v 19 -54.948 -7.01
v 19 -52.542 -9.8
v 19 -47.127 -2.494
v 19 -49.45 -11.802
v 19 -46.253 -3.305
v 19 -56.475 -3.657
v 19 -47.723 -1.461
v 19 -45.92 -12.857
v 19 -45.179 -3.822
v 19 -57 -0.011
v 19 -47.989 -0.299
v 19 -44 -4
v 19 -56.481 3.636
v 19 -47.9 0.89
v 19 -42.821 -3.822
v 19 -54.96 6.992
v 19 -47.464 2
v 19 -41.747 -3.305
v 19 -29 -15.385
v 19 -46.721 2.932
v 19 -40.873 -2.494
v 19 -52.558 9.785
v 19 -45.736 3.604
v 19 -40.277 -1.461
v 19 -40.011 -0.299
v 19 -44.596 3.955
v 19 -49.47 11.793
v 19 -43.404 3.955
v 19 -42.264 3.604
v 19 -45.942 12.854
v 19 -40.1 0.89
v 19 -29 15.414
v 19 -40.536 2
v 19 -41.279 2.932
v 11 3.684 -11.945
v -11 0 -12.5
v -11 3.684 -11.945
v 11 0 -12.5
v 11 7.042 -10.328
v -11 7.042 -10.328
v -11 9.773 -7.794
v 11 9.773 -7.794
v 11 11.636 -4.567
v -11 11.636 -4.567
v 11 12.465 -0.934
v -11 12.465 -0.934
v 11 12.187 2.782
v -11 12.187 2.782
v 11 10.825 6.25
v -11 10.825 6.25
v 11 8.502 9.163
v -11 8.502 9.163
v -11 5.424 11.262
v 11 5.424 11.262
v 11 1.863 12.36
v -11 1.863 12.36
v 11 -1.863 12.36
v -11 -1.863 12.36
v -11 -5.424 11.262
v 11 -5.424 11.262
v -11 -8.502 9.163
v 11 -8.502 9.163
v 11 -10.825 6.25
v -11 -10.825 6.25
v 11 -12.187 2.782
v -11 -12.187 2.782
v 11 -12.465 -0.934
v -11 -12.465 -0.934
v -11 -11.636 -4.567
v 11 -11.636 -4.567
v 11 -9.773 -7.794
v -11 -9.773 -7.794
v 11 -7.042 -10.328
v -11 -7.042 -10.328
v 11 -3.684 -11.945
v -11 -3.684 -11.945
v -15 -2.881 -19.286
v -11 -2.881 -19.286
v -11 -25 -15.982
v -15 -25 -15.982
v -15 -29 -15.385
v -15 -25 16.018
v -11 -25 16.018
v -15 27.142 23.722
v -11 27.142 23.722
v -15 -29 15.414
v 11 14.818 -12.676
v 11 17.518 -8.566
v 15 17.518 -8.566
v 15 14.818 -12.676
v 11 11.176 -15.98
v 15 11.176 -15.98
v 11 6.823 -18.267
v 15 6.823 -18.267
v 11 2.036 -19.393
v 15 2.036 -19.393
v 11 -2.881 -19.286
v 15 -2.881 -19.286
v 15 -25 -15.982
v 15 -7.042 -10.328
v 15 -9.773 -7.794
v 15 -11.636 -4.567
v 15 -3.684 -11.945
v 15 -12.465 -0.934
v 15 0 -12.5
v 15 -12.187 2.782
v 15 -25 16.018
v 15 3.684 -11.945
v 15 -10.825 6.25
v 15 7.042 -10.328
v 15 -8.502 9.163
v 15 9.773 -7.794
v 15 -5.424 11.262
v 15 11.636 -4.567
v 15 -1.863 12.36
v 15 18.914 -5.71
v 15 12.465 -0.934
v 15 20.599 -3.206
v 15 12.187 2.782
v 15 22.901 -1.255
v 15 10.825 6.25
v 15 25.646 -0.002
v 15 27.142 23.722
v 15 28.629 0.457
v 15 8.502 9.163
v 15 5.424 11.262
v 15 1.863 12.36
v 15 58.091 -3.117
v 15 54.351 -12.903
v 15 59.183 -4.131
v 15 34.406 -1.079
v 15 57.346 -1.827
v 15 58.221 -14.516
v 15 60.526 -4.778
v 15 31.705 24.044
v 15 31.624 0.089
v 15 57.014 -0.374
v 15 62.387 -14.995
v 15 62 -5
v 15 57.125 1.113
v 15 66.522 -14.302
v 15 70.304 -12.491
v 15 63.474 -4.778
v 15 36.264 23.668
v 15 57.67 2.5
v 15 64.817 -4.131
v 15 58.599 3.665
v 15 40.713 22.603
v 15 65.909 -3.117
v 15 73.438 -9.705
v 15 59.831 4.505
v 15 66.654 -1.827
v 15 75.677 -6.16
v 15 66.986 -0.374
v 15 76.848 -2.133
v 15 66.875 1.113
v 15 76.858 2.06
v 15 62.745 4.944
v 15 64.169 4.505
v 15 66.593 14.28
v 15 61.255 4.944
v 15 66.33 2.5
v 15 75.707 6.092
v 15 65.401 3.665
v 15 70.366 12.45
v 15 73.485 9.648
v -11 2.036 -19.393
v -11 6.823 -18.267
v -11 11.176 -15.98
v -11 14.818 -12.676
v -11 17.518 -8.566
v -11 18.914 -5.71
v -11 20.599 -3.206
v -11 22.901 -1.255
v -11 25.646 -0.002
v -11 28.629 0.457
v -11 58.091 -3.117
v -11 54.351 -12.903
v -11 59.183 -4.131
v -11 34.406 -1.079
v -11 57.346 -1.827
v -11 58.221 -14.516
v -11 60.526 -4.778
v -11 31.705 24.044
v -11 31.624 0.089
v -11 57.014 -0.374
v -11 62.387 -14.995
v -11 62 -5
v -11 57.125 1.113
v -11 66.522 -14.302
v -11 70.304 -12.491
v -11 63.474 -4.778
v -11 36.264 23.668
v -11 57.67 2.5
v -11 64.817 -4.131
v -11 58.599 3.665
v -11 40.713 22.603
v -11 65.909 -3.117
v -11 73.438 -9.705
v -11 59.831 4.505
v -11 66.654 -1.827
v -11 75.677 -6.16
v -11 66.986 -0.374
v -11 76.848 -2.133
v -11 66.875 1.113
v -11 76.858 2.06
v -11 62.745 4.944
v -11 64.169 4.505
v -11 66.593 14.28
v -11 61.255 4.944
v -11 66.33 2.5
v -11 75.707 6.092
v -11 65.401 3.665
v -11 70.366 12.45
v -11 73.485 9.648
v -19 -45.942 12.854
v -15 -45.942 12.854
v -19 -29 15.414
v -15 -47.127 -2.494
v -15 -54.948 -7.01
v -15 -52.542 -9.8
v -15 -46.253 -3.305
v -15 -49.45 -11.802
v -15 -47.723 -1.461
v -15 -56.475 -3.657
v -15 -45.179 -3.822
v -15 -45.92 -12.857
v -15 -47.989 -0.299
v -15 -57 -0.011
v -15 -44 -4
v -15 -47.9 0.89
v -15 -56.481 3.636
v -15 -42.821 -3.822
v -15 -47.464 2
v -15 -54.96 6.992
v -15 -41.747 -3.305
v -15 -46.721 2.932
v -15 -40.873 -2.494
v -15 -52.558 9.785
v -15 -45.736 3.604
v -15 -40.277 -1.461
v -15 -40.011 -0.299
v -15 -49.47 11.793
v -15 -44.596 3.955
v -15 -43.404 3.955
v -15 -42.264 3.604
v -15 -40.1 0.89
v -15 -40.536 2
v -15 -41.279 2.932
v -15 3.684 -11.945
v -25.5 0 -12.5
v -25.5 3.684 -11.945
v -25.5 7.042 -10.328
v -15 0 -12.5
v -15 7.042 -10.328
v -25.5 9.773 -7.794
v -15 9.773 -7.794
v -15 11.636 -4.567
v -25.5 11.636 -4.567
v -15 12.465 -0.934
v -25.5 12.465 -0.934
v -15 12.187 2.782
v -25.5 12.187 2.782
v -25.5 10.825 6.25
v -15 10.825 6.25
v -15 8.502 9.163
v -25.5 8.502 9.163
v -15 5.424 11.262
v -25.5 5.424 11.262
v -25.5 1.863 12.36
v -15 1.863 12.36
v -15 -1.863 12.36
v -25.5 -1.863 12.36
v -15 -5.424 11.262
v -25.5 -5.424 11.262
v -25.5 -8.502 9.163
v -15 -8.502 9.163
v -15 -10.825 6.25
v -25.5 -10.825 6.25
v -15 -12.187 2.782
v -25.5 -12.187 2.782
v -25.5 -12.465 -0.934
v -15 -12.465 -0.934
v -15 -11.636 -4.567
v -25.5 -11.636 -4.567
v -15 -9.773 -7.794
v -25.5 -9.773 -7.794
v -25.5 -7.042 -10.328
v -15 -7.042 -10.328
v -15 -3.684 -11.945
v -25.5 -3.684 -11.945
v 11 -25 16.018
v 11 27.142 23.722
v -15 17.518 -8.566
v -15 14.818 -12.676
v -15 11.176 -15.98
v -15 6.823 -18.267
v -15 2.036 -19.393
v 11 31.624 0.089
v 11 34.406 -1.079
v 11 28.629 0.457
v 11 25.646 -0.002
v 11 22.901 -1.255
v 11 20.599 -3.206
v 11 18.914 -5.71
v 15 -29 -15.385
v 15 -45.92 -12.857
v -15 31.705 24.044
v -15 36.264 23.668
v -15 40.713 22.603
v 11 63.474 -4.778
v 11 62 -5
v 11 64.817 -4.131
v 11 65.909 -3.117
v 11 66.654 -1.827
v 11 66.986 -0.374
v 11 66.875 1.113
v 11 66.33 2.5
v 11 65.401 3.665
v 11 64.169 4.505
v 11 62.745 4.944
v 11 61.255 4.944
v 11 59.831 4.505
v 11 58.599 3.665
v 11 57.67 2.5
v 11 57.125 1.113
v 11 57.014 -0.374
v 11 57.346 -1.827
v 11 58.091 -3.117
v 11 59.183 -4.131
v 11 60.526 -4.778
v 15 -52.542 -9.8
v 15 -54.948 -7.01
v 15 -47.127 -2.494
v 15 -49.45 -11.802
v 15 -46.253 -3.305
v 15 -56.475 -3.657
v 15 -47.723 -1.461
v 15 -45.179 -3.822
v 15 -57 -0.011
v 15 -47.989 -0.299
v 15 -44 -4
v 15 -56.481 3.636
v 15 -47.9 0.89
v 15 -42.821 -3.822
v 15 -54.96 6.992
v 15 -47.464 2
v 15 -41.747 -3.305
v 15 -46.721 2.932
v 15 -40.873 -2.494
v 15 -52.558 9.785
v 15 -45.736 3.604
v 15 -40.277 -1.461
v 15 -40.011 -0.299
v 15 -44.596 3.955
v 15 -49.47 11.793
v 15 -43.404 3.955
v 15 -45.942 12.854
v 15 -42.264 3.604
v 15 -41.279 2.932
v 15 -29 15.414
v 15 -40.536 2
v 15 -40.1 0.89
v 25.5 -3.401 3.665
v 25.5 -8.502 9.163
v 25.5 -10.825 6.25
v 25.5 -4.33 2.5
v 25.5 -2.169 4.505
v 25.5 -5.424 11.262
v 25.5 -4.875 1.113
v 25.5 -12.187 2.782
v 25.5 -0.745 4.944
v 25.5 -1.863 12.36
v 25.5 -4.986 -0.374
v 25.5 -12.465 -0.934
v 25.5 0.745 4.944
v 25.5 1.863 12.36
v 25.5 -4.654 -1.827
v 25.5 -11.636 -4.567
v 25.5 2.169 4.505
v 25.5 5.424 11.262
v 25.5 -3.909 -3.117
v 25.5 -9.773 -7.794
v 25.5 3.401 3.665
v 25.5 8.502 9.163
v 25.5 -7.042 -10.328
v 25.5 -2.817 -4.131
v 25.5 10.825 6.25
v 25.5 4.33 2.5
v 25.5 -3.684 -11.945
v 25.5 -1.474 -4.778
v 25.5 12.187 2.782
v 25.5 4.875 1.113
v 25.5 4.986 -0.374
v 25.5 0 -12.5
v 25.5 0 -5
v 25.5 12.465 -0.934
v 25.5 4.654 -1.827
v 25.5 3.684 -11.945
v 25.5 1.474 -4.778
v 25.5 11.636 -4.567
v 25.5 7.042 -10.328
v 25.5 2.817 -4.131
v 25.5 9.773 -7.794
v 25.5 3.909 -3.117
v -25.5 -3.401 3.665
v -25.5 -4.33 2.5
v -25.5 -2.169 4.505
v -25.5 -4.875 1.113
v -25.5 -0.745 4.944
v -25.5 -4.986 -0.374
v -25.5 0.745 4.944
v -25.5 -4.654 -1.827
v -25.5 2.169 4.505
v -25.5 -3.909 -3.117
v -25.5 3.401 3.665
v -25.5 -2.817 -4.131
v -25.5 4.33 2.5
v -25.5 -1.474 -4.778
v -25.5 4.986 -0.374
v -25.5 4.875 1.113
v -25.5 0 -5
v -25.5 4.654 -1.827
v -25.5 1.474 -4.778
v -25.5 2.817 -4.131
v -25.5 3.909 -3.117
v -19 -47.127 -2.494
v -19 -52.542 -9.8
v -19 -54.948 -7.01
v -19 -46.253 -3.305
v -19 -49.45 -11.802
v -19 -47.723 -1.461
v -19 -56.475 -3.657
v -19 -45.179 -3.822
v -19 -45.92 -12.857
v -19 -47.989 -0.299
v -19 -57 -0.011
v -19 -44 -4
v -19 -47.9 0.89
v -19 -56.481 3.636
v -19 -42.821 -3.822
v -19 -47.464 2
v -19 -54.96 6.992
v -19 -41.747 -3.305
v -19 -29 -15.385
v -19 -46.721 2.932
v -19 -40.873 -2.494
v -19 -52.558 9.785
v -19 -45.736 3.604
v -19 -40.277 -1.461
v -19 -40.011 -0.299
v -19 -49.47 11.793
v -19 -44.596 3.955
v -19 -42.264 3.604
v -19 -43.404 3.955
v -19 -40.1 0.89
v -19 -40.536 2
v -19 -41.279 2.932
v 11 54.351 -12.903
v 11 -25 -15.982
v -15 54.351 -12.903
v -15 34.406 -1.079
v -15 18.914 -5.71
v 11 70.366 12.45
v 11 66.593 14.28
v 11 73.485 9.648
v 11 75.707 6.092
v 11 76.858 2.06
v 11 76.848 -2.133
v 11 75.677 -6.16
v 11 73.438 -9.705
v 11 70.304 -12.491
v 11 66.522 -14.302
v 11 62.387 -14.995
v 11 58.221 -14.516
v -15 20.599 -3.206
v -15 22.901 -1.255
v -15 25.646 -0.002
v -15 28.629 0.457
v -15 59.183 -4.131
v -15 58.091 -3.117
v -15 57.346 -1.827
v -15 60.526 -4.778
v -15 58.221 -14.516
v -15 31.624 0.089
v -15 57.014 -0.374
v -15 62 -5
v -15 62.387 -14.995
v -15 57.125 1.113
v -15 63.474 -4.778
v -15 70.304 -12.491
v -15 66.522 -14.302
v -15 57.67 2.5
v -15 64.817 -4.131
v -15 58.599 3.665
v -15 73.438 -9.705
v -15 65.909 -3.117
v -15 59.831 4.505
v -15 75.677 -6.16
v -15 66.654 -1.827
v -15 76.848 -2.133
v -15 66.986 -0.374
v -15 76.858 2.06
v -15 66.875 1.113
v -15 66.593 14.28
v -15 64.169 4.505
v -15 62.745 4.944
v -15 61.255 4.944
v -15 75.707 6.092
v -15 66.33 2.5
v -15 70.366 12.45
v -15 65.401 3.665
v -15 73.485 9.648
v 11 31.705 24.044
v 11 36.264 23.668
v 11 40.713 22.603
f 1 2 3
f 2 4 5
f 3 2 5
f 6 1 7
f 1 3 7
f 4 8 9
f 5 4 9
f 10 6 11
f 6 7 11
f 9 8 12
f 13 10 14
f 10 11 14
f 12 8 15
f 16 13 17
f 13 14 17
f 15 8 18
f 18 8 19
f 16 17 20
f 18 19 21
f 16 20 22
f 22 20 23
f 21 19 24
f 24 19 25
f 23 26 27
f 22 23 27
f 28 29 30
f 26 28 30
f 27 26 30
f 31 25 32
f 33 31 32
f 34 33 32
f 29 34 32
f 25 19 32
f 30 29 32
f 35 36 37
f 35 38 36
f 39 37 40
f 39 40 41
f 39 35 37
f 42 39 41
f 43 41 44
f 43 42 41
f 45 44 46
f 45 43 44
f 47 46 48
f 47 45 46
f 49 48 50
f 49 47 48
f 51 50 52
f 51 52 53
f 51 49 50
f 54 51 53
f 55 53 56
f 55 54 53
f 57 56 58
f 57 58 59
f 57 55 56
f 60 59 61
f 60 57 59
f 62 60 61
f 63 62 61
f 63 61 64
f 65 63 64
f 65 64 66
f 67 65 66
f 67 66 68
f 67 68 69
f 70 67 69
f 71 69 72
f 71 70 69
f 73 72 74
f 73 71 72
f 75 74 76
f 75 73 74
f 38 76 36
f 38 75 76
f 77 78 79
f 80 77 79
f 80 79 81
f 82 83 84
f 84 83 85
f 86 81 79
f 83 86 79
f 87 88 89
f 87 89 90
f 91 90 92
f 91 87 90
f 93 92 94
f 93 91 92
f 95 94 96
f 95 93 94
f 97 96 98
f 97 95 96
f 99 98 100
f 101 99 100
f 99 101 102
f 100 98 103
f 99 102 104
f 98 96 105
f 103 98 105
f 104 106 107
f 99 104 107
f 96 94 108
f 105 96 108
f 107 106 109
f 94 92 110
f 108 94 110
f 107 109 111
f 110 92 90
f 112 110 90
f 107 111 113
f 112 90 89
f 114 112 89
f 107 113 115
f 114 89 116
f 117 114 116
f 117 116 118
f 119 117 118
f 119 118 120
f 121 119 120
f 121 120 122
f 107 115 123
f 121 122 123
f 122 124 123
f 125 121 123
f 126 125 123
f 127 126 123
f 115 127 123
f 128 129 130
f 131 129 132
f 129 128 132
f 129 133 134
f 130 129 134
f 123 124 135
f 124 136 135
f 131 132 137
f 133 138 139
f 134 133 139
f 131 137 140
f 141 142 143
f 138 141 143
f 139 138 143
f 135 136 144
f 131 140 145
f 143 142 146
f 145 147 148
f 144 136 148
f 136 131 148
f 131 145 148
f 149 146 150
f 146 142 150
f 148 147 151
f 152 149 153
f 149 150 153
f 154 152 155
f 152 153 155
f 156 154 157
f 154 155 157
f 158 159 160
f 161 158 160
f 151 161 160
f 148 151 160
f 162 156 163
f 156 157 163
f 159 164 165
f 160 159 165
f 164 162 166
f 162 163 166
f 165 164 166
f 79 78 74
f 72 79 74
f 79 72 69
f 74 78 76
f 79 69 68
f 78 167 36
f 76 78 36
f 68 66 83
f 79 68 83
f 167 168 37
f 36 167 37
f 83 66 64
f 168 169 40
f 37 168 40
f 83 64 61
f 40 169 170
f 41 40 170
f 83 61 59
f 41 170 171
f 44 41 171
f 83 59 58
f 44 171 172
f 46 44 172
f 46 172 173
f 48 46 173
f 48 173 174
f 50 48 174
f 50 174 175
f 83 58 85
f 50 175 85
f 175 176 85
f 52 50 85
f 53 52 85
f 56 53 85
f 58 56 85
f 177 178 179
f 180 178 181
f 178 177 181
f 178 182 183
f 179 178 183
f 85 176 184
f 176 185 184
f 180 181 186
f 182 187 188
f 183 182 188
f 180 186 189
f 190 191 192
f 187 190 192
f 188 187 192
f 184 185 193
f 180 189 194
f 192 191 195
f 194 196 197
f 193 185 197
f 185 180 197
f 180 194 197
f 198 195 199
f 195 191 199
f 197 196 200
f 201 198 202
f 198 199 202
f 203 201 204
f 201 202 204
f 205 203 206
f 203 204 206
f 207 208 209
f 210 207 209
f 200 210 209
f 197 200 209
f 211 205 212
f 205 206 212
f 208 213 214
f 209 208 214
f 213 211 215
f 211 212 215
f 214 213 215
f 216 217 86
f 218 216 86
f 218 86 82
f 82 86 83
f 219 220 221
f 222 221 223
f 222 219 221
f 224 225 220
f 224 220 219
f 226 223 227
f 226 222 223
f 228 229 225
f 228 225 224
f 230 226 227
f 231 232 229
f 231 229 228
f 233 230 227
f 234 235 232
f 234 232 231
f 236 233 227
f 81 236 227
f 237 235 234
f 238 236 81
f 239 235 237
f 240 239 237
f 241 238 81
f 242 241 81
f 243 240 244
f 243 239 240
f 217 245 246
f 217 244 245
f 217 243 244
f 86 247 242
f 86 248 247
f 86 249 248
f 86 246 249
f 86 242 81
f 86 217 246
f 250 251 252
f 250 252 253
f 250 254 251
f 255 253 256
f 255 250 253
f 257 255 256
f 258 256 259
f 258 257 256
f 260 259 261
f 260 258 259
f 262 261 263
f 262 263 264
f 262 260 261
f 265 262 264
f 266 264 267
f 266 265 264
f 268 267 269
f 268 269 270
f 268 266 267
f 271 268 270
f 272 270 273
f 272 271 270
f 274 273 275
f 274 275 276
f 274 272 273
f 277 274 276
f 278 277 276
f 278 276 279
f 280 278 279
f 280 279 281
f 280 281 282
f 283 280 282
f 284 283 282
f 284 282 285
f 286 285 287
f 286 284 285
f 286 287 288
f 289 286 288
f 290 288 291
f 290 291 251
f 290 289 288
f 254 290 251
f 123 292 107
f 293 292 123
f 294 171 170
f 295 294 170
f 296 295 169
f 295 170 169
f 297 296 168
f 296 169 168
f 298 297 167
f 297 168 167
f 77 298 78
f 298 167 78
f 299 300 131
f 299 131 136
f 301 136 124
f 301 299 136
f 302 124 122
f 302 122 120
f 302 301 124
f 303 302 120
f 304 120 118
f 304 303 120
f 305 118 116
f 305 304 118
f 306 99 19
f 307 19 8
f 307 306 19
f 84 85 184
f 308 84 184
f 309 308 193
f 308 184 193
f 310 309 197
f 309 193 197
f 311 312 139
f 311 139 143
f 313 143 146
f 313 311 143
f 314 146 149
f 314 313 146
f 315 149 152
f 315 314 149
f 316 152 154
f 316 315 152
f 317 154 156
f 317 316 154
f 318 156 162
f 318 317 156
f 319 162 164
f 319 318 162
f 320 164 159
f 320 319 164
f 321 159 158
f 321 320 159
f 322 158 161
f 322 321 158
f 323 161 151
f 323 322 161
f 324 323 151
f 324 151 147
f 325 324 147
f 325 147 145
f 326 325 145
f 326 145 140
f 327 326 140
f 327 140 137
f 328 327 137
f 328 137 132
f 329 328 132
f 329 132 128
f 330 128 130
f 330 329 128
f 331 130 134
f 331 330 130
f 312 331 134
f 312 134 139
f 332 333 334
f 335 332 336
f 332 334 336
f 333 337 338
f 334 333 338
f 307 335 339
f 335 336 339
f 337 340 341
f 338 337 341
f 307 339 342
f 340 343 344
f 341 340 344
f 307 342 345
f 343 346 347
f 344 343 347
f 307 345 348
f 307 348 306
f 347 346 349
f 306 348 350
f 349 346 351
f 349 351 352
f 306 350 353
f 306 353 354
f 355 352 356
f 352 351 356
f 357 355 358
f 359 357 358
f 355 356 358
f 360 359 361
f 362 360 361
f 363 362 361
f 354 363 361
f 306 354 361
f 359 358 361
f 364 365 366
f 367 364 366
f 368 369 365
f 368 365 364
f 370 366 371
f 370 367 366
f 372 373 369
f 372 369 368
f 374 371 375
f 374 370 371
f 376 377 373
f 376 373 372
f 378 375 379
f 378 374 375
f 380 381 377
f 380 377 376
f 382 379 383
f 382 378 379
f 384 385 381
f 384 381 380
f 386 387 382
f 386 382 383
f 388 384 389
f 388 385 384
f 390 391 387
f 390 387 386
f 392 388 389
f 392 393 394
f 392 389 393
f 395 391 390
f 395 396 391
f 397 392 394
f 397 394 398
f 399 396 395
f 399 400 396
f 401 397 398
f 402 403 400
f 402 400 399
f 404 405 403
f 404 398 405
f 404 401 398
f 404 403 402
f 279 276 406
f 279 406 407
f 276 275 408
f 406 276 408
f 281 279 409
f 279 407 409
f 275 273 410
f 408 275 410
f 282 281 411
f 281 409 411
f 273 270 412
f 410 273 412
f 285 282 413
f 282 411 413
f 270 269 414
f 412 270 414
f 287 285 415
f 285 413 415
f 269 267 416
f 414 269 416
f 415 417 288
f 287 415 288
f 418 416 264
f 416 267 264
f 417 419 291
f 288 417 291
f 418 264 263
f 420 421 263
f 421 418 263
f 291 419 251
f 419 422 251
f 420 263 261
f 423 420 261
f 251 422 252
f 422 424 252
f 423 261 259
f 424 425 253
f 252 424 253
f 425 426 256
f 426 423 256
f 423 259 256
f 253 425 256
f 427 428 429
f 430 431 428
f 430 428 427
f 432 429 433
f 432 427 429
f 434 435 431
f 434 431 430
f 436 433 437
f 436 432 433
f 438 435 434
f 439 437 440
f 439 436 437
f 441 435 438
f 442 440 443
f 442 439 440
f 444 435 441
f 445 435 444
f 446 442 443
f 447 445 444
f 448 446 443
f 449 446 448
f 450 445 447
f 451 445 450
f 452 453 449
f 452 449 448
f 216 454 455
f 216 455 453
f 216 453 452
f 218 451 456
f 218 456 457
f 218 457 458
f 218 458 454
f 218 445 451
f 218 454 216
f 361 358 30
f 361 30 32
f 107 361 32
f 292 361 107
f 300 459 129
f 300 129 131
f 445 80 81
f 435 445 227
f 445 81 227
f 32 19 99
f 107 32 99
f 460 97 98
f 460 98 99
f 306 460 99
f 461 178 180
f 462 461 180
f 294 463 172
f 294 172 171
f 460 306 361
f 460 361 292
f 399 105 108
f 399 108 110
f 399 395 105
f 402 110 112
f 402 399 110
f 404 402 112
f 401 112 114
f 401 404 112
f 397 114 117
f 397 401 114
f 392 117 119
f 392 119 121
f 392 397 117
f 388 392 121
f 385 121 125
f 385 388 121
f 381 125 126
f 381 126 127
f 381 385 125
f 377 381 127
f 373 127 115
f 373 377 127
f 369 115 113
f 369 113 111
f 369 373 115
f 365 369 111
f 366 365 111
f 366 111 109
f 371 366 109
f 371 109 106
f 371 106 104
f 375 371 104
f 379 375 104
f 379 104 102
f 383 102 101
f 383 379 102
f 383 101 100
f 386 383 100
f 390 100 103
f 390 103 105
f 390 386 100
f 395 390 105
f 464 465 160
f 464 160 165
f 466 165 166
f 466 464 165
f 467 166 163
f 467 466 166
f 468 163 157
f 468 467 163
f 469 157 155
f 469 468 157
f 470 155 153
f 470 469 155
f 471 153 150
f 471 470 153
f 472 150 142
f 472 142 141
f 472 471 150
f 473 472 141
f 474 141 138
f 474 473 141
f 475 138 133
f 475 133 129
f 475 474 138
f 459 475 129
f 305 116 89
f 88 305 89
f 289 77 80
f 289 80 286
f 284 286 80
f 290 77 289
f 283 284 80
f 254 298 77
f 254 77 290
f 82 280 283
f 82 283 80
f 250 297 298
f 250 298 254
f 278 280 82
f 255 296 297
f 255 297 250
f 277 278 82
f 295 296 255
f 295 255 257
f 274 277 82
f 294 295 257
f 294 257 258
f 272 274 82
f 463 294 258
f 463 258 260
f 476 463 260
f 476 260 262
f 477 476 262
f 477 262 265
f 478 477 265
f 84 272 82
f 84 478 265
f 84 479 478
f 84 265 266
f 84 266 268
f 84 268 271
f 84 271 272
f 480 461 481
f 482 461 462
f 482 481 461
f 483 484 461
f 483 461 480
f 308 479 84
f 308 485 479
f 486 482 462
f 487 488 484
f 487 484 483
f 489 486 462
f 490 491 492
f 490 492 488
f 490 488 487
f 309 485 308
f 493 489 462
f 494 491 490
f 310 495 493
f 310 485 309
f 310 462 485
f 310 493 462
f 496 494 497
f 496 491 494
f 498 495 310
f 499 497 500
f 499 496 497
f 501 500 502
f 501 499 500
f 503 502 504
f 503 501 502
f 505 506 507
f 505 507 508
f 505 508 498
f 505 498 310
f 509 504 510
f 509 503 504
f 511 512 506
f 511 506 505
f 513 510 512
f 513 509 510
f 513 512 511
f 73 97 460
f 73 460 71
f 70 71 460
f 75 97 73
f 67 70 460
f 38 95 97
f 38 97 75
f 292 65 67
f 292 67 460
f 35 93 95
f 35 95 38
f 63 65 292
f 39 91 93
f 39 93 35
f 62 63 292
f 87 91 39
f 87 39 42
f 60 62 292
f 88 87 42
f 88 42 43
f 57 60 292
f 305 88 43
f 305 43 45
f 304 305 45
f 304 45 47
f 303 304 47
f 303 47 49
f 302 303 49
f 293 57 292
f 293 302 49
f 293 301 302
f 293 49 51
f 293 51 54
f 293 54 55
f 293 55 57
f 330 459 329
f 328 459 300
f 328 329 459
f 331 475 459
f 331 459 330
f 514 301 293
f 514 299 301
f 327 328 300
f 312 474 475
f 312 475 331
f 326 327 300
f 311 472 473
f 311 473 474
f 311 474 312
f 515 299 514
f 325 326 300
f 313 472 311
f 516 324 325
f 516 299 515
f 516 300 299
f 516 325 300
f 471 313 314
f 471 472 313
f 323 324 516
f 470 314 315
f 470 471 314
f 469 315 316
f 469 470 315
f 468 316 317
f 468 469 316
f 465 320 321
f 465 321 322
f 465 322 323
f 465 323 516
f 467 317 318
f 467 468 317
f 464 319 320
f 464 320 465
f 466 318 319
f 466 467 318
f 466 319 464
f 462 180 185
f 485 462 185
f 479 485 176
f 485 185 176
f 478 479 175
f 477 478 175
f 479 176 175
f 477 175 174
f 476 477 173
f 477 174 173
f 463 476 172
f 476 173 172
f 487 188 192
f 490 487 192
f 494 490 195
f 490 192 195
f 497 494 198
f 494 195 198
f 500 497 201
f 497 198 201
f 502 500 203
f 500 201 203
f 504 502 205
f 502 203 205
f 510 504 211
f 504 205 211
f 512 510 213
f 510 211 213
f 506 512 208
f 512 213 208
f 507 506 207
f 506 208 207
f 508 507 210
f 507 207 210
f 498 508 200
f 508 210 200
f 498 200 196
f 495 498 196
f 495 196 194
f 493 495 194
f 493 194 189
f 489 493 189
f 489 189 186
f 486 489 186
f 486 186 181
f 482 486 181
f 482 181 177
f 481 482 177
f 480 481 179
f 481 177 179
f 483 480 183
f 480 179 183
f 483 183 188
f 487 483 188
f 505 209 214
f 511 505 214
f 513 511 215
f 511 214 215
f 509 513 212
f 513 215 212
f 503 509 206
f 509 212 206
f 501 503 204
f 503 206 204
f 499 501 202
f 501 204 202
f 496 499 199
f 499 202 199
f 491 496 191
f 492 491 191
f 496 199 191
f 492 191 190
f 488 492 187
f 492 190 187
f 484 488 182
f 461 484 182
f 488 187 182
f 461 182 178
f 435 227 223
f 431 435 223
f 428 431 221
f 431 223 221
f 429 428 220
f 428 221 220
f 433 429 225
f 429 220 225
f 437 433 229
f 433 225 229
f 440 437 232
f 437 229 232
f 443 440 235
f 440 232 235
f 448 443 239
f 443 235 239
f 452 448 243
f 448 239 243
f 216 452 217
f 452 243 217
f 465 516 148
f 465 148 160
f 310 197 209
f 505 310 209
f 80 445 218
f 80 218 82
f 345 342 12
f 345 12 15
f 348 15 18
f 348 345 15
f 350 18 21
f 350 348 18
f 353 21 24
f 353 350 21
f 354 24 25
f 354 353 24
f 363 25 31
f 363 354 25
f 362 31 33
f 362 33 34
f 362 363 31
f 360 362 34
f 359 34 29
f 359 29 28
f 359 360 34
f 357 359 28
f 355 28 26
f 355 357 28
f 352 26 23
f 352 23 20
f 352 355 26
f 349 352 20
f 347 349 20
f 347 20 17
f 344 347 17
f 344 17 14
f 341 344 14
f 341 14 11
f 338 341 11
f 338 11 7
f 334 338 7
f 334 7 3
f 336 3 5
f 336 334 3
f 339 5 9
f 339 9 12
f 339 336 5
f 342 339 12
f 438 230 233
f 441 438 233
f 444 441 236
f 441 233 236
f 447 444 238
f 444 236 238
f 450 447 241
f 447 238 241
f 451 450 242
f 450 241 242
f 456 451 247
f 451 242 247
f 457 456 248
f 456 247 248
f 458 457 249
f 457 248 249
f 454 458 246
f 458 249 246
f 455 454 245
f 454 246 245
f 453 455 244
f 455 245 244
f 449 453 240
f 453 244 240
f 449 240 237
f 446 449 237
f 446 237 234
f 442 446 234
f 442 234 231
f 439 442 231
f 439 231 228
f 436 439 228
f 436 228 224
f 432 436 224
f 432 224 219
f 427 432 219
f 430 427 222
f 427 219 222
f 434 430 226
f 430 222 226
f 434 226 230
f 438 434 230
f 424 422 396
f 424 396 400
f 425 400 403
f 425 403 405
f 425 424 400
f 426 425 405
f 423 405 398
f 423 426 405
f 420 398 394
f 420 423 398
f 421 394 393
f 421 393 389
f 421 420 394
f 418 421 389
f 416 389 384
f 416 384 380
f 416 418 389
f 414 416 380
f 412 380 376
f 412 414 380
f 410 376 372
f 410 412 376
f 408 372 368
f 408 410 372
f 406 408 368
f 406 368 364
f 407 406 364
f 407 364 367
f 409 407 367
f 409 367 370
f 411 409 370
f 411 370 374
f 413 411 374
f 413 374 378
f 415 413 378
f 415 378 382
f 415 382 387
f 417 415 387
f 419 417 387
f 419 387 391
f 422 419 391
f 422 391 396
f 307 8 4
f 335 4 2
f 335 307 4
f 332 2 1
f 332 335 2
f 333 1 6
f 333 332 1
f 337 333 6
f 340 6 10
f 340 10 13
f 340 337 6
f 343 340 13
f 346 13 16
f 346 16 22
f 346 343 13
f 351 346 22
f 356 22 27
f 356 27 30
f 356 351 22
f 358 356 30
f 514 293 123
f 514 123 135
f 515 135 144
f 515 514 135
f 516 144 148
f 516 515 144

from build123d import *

# Parameters (mm, degrees)
SKETCH_1_R          = 12.5
SKETCH_1_R_2        = 5
EXTRUDE_1_DEPTH     = 25.5
SKETCH_2_R          = 5
SKETCH_2_R_2        = 4
EXTRUDE_2_DEPTH     = 4
SKETCH_3_R          = 4
EXTRUDE_3_DEPTH     = 4
CUT_EXTRUDE_1_DEPTH = 40


with BuildPart() as part:
    # Эскиз1 → Бобышка-Вытянуть1 (new, symmetric)
    with BuildSketch(Plane(origin=(0, 0, 0), x_dir=(0, 0, -1), z_dir=(1, 0, 0))):
        Circle(SKETCH_1_R)
        Circle(SKETCH_1_R_2, mode=Mode.SUBTRACT)
    extrude(amount=EXTRUDE_1_DEPTH, both=True)

    # Эскиз2 → Бобышка-Вытянуть2 (add)
    with BuildSketch(Plane(origin=(11, 0, 0), x_dir=(0, 0, -1), z_dir=(1, 0, 0))):
        with BuildLine():
            Line((19.286048643, -2.880681818), (12.857365762, -45.920454545))
            ThreePointArc((12.857365762, -45.920454545), (0.010828077, -56.99999549), (-12.854148718, -45.94187042))
            Line((-12.854148718, -45.94187042), (-16.017827589, -25))
            Line((-16.017827589, -25), (-23.722142449, 27.142407875))
            ThreePointArc((-23.722142449, 27.142407875), (-23.942938222, 33.992097325), (-22.603459703, 40.713168195))
            Line((-22.603459703, 40.713168195), (-14.279554631, 66.592855272))
            ThreePointArc((-14.279554631, 66.592855272), (6.159605024, 75.676961137), (12.90308202, 54.350786029))
            Line((12.90308202, 54.350786029), (1.079282087, 34.405800714))
            ThreePointArc((1.079282087, 34.405800714), (0.002277121, 25.646156374), (5.709711427, 18.914403089))
            Line((5.709711427, 18.914403089), (8.565518251, 17.518044899))
            ThreePointArc((8.565518251, 17.518044899), (17.261357349, 9.071689063), (19.286048643, -2.880681818))
        make_face()
        Circle(SKETCH_2_R, mode=Mode.SUBTRACT)
        with Locations((0, -44)):
            Circle(SKETCH_2_R_2, mode=Mode.SUBTRACT)
        with Locations((0, 62)):
            Circle(SKETCH_2_R, mode=Mode.SUBTRACT)
    extrude_2 = extrude(amount=EXTRUDE_2_DEPTH)

    # Эскиз3 → Бобышка-Вытянуть3 (add)
    with BuildSketch(Plane(origin=(15, 0, 0), x_dir=(0, 0, -1), z_dir=(1, 0, 0))):
        with BuildLine():
            Line((-16.017827589, -25), (15.982172411, -25))
            Line((15.982172411, -25), (12.857365762, -45.920454545))
            ThreePointArc((12.857365762, -45.920454545), (0.010828077, -56.99999549), (-12.854148718, -45.94187042))
            Line((-12.854148718, -45.94187042), (-16.017827589, -25))
        make_face()
        with Locations((0, -44)):
            Circle(SKETCH_3_R, mode=Mode.SUBTRACT)
    extrude_3 = extrude(amount=EXTRUDE_3_DEPTH)

    # Эскиз5 → Вырез-Вытянуть1 (cut)
    with BuildSketch(Plane.XY.offset(20)):
        Polygon((15, -25), (19, -25), (19, -29), align=None)
        Polygon((15, -57), (15, -29), (11, -25), (11, -57), align=None)
    cut_extrude_1 = extrude(amount=-CUT_EXTRUDE_1_DEPTH, mode=Mode.SUBTRACT)

    # Зеркальное отражение1: Бобышка-Вытянуть2, Бобышка-Вытянуть3, Вырез-Вытянуть1 across plane
    add(extrude_2.mirror(Plane(origin=(0, 0, 0), x_dir=(0, 0, 1), z_dir=(1, 0, 0))))
    add(extrude_3.mirror(Plane(origin=(0, 0, 0), x_dir=(0, 0, 1), z_dir=(1, 0, 0))))
    add(cut_extrude_1.mirror(Plane(origin=(0, 0, 0), x_dir=(0, 0, 1), z_dir=(1, 0, 0))), mode=Mode.SUBTRACT)


solid = part.part
